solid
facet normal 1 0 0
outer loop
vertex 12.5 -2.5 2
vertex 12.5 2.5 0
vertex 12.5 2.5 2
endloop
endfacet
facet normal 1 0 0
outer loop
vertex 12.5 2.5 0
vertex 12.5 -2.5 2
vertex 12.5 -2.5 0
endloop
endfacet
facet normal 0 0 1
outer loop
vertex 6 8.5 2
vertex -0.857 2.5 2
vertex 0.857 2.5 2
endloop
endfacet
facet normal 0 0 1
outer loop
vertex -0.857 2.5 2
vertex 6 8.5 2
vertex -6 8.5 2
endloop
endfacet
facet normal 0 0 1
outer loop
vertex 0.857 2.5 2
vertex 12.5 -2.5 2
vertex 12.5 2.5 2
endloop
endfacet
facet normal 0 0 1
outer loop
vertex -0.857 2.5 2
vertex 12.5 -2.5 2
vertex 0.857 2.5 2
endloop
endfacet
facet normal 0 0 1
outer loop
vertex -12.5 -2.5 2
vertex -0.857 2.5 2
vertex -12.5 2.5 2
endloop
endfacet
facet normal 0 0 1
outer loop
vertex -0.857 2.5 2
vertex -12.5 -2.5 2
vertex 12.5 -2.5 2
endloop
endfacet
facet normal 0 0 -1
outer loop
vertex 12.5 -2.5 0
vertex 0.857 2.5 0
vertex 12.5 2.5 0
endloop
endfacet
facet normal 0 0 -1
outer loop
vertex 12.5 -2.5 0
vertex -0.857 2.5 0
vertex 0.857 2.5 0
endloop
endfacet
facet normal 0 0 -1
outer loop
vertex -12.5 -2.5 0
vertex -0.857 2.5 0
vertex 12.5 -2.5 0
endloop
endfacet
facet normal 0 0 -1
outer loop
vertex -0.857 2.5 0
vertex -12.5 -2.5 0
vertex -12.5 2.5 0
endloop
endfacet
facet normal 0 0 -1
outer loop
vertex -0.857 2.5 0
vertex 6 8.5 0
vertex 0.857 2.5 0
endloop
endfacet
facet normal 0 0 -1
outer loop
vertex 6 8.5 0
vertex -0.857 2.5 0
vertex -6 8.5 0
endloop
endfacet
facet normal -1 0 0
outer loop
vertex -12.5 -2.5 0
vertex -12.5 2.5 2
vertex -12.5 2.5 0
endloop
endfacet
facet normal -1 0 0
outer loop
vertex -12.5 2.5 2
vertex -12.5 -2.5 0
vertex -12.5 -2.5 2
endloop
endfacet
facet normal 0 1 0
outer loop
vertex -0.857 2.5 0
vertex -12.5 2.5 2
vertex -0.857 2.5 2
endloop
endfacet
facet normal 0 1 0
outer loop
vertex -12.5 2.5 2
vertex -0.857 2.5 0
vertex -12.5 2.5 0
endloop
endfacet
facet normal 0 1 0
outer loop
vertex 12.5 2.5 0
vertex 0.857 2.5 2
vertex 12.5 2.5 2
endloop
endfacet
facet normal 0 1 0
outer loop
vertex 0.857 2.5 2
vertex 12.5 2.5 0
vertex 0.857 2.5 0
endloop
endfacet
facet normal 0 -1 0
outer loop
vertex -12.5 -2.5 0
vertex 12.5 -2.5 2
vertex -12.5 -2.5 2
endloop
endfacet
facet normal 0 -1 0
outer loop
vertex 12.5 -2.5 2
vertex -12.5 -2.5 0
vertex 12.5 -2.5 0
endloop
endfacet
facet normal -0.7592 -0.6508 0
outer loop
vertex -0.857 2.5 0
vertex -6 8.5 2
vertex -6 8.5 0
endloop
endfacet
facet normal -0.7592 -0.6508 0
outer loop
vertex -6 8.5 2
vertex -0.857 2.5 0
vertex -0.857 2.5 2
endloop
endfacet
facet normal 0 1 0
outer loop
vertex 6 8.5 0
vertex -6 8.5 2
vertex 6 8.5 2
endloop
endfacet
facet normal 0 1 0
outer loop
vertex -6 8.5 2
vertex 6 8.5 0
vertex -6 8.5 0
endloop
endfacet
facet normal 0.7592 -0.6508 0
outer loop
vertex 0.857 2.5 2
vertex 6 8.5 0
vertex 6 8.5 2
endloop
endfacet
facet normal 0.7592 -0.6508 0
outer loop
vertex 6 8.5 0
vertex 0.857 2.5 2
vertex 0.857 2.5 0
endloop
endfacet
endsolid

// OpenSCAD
union() {
	translate(v = [0, 0, 1.0000000000]) {
		cube(center = true, size = [25, 5, 2]);
	}
	translate(v = [0, 5, 0]) {
		rotate(a = [0, 0, 180]) {
			translate(v = [0, -3.5000000000, 0]) {
				translate(v = [-6.0000000000, 0, 0]) {
					linear_extrude(height = 2) {
						polygon(points = [[0, 0], [12, 0], [6.0000000000, 7]]);
					}
				}
			}
		}
	}
}
